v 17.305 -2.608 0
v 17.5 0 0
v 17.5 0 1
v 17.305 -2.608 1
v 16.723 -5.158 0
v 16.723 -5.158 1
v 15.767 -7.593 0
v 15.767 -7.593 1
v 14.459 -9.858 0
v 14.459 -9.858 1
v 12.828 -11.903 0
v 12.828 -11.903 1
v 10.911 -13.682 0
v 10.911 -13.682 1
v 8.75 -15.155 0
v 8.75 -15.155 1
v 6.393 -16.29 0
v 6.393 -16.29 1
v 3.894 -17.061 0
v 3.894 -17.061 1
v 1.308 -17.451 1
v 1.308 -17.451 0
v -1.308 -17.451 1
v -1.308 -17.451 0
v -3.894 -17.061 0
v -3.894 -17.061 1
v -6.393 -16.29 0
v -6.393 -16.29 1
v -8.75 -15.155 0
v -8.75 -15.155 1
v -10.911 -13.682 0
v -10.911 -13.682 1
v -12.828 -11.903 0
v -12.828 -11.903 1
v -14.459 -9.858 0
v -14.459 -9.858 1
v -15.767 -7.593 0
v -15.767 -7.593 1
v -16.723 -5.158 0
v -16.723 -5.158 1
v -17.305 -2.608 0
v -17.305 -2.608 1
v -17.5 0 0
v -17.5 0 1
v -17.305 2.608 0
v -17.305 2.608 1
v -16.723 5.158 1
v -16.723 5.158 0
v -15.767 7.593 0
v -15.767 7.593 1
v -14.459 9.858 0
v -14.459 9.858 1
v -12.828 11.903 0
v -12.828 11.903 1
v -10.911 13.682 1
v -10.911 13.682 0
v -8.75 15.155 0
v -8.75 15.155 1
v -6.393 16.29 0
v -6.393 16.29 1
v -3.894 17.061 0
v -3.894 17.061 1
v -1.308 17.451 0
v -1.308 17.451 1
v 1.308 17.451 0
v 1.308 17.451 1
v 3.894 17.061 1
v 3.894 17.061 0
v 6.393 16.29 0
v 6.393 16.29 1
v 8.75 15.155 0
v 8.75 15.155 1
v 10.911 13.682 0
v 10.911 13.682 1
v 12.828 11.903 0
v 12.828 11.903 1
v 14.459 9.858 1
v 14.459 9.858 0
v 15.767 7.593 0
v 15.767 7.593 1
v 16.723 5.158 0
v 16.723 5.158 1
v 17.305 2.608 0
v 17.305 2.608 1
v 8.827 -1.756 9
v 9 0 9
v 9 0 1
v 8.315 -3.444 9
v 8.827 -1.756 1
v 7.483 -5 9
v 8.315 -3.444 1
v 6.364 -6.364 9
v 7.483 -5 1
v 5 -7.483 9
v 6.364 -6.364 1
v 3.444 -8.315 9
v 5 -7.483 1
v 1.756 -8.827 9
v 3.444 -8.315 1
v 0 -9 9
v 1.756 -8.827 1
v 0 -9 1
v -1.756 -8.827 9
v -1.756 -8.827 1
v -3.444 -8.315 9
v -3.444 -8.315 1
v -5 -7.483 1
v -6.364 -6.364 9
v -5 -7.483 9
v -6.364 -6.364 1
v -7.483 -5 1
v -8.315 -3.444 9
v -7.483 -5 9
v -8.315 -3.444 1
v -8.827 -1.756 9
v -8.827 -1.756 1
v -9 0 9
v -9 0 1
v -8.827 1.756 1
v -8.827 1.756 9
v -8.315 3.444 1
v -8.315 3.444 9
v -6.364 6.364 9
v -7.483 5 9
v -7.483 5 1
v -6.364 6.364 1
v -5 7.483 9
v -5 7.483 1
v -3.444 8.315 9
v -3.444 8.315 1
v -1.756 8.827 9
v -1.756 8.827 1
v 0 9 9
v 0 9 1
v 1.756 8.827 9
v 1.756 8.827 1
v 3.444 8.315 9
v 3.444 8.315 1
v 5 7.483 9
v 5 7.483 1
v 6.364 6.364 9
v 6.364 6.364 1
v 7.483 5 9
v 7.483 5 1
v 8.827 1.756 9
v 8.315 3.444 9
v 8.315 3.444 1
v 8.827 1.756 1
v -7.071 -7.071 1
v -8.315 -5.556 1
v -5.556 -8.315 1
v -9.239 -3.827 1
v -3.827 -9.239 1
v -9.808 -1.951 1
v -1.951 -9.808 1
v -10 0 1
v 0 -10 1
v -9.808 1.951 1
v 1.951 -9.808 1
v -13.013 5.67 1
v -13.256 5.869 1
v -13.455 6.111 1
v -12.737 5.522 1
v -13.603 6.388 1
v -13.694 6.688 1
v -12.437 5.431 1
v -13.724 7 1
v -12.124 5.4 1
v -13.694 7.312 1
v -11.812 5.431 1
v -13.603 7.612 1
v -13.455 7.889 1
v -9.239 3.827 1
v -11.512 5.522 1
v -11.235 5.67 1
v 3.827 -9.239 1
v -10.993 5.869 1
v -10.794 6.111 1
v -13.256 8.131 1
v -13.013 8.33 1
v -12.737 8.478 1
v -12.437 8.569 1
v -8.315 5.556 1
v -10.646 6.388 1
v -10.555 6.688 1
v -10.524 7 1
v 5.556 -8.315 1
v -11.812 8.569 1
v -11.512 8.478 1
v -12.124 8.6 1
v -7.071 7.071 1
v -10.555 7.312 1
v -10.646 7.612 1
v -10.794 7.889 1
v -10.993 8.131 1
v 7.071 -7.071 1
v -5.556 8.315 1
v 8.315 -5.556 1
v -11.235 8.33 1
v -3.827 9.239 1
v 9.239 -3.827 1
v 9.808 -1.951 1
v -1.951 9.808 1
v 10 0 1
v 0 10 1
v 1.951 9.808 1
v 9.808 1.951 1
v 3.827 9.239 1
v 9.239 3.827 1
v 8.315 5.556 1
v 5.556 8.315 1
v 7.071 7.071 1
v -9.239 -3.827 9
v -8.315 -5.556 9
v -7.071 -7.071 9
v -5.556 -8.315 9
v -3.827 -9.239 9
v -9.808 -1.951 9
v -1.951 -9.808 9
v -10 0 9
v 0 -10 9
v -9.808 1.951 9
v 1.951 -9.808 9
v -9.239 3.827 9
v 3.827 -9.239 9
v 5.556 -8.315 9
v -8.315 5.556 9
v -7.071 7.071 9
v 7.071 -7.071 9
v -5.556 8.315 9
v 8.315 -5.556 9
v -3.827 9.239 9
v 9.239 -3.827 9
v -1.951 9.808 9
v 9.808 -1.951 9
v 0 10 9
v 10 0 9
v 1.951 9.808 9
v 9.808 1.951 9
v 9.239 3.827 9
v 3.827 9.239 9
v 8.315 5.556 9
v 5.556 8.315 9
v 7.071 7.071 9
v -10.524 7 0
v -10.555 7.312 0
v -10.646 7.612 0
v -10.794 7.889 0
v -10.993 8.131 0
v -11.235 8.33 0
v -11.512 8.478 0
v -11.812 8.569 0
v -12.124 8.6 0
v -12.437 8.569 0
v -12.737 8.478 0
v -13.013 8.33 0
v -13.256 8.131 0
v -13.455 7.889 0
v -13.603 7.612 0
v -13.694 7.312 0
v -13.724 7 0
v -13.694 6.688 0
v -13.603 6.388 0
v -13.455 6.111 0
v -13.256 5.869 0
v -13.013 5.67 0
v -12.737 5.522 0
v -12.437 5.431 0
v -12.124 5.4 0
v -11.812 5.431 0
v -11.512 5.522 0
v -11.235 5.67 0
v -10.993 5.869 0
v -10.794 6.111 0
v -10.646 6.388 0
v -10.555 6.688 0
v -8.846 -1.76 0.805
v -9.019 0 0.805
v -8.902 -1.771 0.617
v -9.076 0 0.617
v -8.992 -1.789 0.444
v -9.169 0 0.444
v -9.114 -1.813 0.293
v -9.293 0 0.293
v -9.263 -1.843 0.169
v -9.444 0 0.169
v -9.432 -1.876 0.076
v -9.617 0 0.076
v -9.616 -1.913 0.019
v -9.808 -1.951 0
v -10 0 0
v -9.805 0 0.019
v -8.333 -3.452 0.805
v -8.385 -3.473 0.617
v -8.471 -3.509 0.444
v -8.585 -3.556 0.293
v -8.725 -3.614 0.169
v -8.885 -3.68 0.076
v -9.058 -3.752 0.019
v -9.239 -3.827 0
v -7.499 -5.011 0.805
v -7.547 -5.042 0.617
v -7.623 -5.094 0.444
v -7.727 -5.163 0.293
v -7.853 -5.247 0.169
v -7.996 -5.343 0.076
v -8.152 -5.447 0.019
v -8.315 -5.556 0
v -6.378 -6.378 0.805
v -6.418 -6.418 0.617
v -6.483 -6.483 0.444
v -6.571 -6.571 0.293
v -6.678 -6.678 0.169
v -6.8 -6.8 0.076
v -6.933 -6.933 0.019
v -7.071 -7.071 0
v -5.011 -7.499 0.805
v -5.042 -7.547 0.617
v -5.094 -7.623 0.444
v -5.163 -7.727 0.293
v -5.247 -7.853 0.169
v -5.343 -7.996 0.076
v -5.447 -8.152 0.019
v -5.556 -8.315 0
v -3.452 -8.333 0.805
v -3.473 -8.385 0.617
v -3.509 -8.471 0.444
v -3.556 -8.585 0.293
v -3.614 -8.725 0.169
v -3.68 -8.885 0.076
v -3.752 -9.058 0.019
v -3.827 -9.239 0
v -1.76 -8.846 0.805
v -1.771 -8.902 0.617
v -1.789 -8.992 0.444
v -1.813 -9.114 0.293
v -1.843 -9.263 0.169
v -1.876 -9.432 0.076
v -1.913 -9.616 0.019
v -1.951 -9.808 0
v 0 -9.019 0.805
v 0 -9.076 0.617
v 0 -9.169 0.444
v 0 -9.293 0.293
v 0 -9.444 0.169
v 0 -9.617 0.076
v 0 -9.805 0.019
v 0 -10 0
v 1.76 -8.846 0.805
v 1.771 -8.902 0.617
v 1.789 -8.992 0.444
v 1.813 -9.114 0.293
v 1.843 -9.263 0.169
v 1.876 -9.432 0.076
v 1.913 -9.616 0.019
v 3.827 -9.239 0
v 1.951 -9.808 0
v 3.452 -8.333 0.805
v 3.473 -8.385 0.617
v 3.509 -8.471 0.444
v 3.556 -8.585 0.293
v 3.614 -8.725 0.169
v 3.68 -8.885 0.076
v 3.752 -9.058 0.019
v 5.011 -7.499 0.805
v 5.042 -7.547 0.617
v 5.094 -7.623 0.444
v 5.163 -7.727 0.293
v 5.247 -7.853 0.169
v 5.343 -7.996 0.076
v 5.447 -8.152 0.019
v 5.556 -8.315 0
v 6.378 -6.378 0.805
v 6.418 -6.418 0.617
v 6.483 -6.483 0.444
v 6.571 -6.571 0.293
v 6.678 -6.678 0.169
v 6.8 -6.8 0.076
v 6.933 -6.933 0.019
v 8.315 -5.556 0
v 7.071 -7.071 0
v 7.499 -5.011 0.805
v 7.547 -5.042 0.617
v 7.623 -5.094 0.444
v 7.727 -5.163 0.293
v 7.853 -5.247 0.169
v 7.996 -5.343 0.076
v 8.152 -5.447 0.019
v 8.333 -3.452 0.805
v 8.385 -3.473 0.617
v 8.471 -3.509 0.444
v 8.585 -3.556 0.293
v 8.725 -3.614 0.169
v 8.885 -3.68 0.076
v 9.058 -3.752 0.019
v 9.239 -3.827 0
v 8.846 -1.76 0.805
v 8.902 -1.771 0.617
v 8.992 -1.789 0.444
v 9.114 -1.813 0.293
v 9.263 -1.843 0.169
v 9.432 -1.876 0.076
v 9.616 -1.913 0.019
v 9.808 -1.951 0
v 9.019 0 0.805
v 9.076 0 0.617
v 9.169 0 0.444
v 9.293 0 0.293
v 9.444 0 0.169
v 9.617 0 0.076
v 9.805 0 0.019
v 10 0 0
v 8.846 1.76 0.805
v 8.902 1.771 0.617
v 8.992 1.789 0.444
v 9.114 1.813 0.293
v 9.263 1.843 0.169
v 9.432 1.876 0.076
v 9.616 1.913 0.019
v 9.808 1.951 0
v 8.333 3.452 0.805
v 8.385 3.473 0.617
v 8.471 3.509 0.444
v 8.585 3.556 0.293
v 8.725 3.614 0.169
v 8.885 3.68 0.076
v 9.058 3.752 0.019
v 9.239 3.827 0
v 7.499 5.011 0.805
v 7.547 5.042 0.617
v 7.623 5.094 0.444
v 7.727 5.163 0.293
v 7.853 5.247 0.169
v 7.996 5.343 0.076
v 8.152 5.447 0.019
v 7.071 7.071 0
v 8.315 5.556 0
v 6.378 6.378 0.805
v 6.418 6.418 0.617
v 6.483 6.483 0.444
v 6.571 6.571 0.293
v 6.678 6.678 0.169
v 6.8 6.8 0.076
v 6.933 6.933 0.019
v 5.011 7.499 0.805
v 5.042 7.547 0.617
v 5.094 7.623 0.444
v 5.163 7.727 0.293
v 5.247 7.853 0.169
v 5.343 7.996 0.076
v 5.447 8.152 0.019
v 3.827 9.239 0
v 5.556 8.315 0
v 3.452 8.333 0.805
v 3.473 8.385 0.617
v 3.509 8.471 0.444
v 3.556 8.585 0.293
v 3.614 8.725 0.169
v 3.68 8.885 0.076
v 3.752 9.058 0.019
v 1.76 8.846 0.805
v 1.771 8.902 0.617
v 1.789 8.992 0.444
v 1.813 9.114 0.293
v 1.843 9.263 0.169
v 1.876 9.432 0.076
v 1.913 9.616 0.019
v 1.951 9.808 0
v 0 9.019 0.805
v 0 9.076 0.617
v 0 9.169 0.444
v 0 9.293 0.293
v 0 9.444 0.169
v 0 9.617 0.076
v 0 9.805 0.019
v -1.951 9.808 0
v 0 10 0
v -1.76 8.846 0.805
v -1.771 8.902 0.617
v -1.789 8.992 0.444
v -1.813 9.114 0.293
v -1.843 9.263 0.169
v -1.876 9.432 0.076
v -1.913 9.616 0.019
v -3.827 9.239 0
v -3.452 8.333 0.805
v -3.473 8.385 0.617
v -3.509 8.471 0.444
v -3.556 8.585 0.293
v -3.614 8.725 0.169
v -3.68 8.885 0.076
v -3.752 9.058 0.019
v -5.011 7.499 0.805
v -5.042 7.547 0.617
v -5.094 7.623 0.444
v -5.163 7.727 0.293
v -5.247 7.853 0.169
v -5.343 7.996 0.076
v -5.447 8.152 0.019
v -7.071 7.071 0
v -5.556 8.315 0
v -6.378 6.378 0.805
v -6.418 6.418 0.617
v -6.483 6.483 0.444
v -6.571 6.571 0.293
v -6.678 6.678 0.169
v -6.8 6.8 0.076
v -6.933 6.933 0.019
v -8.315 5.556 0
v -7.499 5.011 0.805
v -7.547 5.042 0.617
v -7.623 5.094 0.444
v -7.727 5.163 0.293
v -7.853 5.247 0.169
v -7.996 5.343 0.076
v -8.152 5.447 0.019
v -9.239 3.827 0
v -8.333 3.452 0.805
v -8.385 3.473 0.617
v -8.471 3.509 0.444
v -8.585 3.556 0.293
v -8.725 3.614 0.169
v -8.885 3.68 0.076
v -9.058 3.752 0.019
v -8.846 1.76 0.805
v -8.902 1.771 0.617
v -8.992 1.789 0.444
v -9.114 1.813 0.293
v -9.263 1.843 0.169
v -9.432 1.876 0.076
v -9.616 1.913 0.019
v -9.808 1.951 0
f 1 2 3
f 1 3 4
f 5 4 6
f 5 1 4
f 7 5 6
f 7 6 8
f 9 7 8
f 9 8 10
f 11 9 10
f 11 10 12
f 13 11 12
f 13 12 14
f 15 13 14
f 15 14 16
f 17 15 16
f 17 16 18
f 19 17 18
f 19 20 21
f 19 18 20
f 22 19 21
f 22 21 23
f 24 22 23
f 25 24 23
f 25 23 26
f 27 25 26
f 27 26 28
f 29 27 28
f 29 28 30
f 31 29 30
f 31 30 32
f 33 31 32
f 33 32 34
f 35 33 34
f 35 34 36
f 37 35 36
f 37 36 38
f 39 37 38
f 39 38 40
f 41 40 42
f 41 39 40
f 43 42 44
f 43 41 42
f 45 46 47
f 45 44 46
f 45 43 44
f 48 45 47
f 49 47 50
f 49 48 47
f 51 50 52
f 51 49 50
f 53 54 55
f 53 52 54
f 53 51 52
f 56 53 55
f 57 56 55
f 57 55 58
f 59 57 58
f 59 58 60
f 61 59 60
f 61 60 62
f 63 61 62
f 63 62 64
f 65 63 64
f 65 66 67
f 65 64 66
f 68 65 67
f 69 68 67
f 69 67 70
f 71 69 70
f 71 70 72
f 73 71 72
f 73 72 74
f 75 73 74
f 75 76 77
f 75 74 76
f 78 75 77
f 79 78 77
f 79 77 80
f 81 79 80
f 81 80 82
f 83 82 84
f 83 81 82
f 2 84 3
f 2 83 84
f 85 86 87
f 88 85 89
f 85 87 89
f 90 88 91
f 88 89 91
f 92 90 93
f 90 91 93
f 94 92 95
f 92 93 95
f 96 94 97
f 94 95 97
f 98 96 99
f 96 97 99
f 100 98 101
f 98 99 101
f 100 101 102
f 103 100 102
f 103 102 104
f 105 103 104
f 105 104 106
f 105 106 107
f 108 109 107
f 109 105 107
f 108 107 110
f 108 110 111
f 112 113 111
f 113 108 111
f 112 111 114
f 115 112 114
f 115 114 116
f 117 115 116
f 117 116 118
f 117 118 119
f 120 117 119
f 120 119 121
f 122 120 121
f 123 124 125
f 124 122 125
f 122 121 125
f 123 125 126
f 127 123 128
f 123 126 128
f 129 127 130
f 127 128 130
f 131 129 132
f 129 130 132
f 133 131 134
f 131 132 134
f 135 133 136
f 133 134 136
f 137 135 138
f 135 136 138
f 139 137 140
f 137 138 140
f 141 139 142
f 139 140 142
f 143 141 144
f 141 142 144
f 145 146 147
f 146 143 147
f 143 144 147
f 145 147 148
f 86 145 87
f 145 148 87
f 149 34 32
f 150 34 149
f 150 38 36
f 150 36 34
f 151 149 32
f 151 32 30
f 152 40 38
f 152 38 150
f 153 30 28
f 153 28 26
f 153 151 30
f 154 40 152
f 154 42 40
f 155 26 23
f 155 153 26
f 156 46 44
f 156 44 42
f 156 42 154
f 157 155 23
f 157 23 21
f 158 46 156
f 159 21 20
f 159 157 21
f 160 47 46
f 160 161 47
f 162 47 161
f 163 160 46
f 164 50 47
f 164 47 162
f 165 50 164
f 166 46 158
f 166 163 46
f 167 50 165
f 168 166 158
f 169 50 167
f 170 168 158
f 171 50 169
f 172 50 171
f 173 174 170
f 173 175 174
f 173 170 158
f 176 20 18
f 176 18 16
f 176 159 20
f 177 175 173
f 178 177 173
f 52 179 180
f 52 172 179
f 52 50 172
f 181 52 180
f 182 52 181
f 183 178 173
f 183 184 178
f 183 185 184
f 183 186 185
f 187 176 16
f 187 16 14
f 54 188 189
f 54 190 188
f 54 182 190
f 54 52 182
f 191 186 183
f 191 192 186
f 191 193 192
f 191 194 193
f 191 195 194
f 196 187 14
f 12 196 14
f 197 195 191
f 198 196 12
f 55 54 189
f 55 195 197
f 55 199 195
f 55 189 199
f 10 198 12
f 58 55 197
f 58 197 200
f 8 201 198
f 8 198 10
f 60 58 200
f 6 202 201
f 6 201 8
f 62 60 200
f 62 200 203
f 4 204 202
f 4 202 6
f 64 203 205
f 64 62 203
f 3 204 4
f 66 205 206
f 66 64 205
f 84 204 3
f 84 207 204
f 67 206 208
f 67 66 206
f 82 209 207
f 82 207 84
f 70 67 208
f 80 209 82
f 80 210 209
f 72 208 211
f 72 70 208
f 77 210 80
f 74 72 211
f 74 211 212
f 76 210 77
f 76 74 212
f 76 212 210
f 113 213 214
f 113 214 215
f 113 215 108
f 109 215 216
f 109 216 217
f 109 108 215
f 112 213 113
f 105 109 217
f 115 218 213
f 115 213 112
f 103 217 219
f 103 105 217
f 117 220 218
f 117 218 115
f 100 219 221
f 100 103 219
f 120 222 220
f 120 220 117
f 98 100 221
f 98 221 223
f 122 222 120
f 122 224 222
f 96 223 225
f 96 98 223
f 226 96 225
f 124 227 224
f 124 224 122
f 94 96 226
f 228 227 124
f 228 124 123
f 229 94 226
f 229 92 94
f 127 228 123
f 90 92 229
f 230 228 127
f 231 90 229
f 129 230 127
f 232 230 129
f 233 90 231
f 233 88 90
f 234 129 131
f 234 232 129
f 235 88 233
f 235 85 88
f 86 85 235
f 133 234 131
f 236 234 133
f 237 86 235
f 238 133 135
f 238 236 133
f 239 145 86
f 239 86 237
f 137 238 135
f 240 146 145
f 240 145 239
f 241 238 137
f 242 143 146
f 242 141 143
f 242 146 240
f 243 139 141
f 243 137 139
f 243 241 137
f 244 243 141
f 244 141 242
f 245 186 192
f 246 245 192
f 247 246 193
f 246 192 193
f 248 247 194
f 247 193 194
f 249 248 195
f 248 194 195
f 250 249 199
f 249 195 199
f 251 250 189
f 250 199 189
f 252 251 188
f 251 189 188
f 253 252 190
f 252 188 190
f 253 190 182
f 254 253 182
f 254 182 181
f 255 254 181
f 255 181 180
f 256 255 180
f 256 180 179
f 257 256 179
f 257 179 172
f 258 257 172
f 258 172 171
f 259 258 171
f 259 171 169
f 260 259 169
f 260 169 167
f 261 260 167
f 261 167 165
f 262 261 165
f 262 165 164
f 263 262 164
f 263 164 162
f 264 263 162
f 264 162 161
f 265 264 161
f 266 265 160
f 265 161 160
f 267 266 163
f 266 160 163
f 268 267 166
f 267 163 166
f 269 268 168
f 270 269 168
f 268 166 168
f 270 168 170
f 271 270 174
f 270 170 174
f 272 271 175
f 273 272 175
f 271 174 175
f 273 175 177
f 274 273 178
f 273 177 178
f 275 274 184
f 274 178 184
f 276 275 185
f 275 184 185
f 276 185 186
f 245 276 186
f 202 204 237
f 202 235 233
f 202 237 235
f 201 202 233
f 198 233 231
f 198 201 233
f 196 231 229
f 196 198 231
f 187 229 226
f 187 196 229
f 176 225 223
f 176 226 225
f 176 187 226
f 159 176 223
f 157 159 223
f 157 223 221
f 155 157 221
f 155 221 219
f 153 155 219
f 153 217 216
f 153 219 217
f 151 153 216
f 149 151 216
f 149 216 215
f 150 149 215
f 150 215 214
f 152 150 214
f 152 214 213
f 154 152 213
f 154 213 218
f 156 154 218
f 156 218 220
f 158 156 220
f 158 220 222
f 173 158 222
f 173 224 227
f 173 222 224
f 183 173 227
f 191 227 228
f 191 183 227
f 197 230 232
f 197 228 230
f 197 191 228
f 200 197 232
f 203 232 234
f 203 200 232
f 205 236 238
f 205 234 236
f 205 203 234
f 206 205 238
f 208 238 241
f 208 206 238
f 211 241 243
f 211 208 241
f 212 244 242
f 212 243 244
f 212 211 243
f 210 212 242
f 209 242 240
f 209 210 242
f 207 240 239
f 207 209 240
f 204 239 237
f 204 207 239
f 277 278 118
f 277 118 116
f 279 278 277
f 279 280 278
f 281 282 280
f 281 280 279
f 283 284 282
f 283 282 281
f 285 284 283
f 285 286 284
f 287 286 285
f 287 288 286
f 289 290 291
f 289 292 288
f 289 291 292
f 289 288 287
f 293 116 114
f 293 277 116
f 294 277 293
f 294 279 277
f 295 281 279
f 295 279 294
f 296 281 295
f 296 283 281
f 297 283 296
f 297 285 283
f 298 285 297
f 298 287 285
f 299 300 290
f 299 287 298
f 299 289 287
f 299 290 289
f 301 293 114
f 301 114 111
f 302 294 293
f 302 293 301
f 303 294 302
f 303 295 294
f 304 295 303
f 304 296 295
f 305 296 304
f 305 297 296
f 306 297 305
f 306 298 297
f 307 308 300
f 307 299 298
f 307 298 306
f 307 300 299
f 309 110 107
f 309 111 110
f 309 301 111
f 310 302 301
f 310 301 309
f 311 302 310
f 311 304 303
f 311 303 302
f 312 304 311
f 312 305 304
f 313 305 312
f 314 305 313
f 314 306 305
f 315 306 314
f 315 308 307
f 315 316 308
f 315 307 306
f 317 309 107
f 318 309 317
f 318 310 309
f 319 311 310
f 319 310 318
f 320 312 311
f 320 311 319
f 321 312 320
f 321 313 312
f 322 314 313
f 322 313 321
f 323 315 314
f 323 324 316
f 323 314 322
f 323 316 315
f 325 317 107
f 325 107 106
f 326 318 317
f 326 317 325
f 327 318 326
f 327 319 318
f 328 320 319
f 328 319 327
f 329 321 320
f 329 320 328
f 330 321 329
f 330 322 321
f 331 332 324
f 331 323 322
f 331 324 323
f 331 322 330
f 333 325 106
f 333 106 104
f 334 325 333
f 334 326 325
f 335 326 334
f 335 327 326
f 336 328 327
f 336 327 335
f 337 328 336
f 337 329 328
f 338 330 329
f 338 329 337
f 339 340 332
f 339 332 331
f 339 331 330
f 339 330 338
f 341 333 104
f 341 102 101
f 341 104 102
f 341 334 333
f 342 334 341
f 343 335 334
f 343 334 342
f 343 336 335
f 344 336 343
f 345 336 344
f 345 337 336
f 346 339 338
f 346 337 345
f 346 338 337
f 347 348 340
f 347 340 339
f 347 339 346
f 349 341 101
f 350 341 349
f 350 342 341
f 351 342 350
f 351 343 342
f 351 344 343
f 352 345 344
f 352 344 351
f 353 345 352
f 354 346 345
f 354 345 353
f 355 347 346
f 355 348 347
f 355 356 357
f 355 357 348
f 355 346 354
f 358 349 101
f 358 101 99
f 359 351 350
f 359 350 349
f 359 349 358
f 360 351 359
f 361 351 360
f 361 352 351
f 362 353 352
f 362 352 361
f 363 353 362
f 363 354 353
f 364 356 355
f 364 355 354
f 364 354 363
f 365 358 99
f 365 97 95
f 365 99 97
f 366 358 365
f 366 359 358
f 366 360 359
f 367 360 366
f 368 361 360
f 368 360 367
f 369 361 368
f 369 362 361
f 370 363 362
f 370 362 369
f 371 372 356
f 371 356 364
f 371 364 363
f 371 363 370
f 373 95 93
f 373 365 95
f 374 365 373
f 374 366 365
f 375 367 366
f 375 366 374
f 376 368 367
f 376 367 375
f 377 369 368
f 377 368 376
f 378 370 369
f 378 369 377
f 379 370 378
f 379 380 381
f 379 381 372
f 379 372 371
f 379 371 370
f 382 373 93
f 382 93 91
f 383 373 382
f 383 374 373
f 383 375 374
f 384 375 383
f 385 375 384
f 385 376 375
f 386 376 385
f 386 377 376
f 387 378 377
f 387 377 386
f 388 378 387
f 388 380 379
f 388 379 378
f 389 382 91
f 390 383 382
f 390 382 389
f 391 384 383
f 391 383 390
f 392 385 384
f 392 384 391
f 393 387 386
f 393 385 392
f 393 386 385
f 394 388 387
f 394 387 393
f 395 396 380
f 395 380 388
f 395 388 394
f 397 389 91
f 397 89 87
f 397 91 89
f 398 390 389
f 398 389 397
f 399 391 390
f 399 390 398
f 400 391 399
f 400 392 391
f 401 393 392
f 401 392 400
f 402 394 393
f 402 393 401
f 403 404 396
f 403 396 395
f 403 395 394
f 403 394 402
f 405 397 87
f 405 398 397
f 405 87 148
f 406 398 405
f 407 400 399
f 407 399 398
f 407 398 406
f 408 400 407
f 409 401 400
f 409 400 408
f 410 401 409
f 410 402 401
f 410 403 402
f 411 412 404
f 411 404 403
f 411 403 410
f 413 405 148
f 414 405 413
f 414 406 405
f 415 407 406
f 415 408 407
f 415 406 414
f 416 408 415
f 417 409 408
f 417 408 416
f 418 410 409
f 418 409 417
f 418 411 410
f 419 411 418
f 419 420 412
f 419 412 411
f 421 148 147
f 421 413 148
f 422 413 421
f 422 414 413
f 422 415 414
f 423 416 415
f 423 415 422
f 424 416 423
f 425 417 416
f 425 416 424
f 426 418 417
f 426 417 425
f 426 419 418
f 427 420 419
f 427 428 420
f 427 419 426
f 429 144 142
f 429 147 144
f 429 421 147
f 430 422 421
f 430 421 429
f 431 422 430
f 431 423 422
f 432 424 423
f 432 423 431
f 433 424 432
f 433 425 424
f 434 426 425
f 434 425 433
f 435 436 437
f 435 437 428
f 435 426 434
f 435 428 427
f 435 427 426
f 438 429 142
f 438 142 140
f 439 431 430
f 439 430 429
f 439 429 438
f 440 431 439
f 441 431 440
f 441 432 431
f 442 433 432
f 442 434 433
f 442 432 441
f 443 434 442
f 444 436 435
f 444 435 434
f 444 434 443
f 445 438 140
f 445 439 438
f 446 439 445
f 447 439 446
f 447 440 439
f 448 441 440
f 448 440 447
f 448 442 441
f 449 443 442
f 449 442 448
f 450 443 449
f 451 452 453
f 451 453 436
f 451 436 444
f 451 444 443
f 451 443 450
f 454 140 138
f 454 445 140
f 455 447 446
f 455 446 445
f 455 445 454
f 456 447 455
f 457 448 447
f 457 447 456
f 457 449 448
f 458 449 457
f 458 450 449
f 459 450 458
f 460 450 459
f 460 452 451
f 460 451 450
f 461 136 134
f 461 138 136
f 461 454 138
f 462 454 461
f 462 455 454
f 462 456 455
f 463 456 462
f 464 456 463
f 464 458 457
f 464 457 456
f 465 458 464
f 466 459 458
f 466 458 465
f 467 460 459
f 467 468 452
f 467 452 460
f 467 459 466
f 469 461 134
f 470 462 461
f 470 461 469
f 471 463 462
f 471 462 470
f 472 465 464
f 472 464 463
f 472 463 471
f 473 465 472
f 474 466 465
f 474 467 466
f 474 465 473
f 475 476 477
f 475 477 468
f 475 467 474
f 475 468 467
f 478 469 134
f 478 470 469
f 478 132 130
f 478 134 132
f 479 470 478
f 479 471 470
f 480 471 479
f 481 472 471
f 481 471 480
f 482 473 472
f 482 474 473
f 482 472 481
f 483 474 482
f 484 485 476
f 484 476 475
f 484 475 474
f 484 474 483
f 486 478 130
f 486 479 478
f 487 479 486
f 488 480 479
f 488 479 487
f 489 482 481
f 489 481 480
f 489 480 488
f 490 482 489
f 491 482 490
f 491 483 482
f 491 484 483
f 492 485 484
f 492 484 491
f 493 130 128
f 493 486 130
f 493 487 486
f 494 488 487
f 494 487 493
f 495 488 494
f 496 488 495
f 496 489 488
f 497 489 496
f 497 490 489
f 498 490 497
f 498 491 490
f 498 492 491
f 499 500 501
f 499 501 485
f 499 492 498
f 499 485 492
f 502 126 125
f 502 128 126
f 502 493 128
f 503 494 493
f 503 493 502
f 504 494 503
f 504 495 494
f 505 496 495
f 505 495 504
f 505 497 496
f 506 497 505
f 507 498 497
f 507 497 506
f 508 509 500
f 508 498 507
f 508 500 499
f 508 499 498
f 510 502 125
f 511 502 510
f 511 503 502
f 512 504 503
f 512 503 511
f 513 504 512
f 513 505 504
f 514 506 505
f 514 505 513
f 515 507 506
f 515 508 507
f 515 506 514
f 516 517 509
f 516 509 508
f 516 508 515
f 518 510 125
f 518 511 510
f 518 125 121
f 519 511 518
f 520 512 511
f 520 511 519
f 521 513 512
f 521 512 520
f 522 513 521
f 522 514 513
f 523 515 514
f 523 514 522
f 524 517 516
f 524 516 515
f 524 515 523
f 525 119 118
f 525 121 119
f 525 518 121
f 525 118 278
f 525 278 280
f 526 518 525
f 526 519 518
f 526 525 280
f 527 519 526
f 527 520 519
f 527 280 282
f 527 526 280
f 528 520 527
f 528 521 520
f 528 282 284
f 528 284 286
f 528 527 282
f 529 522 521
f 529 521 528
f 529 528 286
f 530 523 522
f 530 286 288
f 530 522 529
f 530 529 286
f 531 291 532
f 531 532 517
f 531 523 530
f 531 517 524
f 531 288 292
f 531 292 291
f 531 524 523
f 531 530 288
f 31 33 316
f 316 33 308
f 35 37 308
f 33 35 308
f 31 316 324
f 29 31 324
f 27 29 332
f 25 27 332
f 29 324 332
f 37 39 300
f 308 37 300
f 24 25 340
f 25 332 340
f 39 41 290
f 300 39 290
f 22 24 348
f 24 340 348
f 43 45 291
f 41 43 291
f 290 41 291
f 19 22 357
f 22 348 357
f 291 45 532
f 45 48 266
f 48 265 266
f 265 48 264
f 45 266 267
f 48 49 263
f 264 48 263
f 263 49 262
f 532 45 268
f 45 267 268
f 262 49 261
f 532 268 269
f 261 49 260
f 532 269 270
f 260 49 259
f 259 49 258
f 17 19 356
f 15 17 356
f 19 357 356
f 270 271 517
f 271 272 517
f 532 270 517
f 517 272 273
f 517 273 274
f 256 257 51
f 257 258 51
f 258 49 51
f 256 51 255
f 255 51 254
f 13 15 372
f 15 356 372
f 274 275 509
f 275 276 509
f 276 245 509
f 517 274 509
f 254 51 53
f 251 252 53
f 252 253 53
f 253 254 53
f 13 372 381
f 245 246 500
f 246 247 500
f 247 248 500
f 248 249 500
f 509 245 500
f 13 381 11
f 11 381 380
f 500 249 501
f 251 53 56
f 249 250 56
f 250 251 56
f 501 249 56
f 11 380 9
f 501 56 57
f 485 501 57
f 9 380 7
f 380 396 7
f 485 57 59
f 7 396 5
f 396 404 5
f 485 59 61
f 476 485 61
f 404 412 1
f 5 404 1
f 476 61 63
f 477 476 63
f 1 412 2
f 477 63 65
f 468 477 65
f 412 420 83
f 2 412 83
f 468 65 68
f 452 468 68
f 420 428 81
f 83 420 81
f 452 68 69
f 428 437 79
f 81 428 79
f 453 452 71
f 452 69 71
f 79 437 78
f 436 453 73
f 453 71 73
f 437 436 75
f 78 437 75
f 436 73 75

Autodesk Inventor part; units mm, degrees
ref_plane "YZ Plane" through (0, 0, 0) normal (1, 0, 0) x (0, 1, 0)
ref_plane "XZ Plane" through (0, 0, 0) normal (0, 1, 0) x (-1, 0, 0)
ref_plane "XY Plane" through (0, 0, 0) normal (0, 0, 1) x (1, 0, 0)
sketch "Sketch1" plane through (0, 0, 0) normal (0, 0, 1) x (1, 0, 0)
  circle A0 centre (0, 0) radius 10
  circle A1 centre (0, 0) radius 17.5
  dimension "d0" = 35
  dimension "d1" = 20
extrude "Extrusion1" add sketch "Sketch1" along normal blind 1
sketch "Sketch2" plane through (0, 0, 1) normal (0, 0, 1) x (1, 0, 0)
  circle A0 centre (-12.1244, 7) radius 1.6
  circle A1 centre (0, 0) radius 10 projected
  circle A2 centre (0, 0) radius 17.5 projected
  line L0 (0, 0) -> (-10, 0) construction
  line L1 (-15.1554, 8.75) -> (-8.6603, 5) construction
  circle A3 centre (0, 0) radius 14 construction
  point P0 (-11.9078, 6.875)
  dimension "d16" = 28
  dimension "d4" = 3.2
  dimension "d8" = 30
extrude "Extrusion2" cut sketch "Sketch2" against normal through all contours A0
sketch "Sketch3" plane through (0, 0, 1) normal (0, 0, 1) x (1, 0, 0)
  circle A0 centre (0, 0) radius 9
  circle A1 centre (0, 0) radius 10
  circle A2 centre (0, 0) radius 10 projected
  dimension "d10" = 1
  dimension "d11" = 20
extrude "Extrusion3" add sketch "Sketch3" along normal blind 8
sketch "Sketch4" plane through (0, 0, 1) normal (0, 0, -1) x (-1, 0, 0)
  circle A0 centre (0, 0) radius 9 projected
  circle A1 centre (0, 0) radius 10 projected
extrude "Extrusion4" add sketch "Sketch4" along normal up to surface (1 mm away)
fillet "Fillet1" radius 1 1 edges at (9, 0, 0)
properties part number "Pre-Anode" material "Stainless Steel"
